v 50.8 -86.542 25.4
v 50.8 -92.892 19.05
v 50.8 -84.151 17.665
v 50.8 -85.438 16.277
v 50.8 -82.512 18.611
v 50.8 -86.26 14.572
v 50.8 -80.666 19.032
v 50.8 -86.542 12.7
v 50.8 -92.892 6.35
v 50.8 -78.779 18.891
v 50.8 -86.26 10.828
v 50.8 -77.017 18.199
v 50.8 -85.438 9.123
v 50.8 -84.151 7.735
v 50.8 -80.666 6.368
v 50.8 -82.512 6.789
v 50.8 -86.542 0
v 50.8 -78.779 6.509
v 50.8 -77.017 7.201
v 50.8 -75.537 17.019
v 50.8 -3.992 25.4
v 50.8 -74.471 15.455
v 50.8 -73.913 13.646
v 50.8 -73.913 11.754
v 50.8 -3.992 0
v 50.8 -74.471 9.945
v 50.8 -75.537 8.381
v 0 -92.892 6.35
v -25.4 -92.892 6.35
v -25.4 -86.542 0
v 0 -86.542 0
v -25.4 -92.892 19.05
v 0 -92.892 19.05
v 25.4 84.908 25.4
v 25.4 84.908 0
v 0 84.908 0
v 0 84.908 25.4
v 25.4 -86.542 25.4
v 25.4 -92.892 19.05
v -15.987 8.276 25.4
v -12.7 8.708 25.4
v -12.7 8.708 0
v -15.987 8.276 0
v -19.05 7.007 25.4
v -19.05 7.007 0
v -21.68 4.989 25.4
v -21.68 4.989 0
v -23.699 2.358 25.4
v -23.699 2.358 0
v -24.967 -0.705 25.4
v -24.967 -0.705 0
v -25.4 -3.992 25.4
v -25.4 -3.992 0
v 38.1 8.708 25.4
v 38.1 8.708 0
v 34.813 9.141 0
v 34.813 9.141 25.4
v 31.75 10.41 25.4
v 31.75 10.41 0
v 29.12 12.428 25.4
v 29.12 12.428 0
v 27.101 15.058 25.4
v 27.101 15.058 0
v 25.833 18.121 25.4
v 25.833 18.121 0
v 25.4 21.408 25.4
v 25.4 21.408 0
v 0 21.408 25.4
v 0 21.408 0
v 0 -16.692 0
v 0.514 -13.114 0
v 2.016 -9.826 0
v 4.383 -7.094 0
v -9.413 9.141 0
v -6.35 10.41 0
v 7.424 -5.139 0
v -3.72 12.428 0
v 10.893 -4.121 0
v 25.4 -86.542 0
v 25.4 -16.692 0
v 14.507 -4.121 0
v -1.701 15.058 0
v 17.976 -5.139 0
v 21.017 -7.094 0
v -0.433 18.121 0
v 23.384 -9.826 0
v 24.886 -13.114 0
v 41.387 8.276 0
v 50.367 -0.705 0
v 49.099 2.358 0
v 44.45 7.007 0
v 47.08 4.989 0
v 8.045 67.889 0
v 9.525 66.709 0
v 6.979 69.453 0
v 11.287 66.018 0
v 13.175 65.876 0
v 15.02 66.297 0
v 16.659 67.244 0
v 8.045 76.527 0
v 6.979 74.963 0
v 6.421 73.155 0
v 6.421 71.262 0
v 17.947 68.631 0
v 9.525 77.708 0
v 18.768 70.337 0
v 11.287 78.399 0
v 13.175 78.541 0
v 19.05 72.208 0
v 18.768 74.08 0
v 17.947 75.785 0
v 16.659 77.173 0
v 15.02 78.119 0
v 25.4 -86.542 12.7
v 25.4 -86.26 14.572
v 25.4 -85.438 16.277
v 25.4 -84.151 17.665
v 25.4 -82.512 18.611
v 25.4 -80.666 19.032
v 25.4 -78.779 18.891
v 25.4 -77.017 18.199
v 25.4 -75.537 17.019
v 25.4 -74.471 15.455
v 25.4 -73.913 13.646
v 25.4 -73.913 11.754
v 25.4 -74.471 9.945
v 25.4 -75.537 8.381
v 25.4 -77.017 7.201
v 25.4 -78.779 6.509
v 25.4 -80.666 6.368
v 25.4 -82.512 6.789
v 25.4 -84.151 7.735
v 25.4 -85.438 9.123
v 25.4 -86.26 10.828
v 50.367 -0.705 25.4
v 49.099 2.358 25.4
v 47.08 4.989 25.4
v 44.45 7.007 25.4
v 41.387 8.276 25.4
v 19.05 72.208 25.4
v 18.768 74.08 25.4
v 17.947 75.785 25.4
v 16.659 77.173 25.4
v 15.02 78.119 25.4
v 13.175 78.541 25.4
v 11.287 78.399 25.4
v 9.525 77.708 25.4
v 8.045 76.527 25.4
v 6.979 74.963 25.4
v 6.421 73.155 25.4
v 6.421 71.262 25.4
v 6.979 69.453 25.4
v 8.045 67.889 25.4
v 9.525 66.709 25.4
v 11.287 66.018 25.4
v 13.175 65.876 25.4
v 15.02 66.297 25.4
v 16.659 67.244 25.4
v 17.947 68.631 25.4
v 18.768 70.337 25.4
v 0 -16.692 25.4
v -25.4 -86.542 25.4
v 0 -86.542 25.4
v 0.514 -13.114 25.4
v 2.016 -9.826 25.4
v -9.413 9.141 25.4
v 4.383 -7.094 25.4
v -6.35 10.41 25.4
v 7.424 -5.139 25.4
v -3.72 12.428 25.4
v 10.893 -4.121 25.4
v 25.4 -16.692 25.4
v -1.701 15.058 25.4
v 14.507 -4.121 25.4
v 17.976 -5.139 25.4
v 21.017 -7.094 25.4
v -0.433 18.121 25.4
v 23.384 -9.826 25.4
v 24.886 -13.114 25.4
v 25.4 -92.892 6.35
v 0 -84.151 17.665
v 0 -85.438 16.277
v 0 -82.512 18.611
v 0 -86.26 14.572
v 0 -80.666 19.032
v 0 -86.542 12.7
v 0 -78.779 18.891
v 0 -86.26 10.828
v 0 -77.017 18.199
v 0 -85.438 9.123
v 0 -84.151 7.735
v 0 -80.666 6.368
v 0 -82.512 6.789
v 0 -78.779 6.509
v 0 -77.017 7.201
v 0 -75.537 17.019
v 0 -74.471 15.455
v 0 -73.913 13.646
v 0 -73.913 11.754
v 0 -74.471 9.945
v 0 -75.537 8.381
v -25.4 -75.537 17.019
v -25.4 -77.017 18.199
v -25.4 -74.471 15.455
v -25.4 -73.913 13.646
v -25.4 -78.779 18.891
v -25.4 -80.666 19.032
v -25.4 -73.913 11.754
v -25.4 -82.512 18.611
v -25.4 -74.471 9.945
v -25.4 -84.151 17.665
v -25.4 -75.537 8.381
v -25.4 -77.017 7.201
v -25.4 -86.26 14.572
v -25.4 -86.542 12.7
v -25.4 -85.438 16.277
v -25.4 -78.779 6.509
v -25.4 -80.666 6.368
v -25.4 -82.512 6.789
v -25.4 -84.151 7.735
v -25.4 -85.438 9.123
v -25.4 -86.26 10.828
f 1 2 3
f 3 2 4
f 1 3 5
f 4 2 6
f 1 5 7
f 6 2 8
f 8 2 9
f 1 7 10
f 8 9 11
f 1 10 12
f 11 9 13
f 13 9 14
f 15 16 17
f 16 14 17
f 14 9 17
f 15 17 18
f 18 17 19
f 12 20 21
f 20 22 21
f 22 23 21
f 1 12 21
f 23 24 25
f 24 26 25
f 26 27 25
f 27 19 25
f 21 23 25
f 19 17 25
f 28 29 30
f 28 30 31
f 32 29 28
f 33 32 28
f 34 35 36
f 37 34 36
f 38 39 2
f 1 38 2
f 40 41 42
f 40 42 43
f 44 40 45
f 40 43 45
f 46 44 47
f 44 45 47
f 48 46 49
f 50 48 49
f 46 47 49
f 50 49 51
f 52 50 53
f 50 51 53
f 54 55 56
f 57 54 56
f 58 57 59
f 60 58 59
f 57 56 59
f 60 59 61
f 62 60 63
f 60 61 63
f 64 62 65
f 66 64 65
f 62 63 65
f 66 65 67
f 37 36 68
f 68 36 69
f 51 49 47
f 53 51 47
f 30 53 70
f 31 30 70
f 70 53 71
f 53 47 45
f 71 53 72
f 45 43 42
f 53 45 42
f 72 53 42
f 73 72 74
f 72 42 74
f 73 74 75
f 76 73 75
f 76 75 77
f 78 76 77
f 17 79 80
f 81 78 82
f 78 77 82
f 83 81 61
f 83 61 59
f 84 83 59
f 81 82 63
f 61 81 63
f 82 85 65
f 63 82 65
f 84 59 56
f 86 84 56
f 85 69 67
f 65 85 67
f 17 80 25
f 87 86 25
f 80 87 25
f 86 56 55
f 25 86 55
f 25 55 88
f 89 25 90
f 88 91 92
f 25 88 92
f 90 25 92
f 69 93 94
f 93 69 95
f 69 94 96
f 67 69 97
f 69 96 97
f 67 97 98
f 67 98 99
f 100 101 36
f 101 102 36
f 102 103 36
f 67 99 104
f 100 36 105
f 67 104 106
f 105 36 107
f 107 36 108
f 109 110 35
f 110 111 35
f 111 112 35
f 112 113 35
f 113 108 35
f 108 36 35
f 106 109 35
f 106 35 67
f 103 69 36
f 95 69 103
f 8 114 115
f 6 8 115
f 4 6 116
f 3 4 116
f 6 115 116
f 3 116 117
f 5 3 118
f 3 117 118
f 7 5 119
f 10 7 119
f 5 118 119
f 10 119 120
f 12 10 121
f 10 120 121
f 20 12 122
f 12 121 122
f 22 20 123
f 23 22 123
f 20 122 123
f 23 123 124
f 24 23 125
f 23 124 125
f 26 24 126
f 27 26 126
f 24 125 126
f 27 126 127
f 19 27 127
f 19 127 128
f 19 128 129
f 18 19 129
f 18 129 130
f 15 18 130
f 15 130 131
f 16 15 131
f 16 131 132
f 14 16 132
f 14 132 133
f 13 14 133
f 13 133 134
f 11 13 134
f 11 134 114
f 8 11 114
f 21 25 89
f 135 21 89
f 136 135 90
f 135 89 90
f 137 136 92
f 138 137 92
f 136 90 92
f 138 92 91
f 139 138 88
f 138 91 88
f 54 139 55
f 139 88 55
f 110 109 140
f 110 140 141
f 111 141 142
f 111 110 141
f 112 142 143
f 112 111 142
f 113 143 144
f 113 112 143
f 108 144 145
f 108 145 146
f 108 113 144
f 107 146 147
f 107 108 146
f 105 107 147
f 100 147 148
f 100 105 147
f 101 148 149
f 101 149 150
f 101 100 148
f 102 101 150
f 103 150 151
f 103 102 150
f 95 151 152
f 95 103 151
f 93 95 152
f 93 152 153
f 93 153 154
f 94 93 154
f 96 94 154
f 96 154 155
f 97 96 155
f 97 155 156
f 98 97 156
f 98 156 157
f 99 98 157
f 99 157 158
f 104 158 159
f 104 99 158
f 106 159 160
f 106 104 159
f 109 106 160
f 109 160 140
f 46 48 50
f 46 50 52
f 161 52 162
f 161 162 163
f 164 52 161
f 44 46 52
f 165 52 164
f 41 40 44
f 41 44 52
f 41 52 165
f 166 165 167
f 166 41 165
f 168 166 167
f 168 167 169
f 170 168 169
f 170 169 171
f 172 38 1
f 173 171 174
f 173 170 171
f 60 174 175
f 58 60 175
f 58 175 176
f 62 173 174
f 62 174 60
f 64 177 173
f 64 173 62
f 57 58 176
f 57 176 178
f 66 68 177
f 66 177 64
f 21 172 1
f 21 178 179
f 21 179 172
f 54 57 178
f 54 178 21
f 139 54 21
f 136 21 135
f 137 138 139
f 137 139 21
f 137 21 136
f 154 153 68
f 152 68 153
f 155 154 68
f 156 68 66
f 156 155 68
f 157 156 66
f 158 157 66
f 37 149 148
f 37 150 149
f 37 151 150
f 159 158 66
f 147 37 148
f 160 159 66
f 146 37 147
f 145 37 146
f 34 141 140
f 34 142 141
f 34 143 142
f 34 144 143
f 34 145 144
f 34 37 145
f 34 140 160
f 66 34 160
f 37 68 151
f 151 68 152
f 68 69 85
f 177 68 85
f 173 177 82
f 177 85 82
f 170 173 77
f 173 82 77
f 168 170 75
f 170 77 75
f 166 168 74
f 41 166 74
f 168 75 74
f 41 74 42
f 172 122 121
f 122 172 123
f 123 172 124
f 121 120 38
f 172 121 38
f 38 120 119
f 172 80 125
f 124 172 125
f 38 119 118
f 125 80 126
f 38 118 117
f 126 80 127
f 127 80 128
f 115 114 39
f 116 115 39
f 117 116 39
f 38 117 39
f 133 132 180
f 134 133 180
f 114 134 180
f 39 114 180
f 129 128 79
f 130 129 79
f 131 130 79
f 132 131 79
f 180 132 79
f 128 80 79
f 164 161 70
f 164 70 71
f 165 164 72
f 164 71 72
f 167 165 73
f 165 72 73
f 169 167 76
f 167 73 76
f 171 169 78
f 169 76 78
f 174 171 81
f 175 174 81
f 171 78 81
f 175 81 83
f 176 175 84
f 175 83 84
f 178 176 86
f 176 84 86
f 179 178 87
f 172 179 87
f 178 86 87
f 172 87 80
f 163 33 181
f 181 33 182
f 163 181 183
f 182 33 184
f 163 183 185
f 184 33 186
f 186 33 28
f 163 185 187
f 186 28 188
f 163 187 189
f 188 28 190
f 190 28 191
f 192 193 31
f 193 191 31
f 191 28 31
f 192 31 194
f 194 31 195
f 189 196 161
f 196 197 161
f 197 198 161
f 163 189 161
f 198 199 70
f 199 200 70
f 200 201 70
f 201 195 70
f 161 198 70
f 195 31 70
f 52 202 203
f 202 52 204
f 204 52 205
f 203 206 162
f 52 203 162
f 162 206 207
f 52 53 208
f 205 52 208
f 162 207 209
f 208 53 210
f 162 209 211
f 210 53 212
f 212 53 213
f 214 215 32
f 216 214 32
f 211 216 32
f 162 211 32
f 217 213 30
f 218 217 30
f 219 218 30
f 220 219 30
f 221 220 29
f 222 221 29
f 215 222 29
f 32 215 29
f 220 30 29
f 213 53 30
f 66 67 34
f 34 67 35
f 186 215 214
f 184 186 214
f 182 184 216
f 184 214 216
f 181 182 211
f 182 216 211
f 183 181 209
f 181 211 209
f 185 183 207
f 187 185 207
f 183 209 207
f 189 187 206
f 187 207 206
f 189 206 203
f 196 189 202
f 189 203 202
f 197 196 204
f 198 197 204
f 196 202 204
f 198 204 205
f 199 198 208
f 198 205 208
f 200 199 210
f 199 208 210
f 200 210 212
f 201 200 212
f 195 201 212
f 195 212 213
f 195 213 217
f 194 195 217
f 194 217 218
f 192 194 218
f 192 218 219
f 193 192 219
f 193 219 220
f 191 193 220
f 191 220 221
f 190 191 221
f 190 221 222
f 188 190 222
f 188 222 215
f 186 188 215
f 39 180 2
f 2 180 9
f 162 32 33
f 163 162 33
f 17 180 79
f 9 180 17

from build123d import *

# Parameters (mm, degrees)
F0_R     = 6.35
F1_DEPTH = 25.4
F2_R     = 6.35
F3_DEPTH = 76.2
F4_SIZE  = 6.35


with BuildPart() as f1:
    # F0 (on Top) → F1 (new body)
    with BuildSketch(Plane.XY):
        with BuildLine():
            Line((25.4, 84.908329), (0, 84.908329))
            Line((0, 84.908329), (0, 21.408329))
            ThreePointArc((0, 21.408329), (-3.719744, 12.428073), (-12.7, 8.708329))
            ThreePointArc((-12.7, 8.708329), (-21.680256, 4.988585), (-25.4, -3.991671))
            Line((-25.4, -3.991671), (-25.4, -92.891671))
            Line((-25.4, -92.891671), (0, -92.891671))
            Line((0, -92.891671), (0, -16.691671))
            ThreePointArc((0, -16.691671), (12.7, -3.991671), (25.4, -16.691671))
            Line((25.4, -16.691671), (25.4, -92.891671))
            Line((25.4, -92.891671), (50.8, -92.891671))
            Line((50.8, -92.891671), (50.8, -3.991671))
            ThreePointArc((50.8, -3.991671), (47.080256, 4.988585), (38.1, 8.708329))
            ThreePointArc((38.1, 8.708329), (29.119744, 12.428073), (25.4, 21.408329))
            Line((25.4, 21.408329), (25.4, 84.908329))
        make_face()
        with Locations((12.7, 72.208329)):
            Circle(F0_R, mode=Mode.SUBTRACT)
    extrude(amount=F1_DEPTH)

    # F2 (on face) → F3 (cut)
    with BuildSketch(Plane(origin=(-25.4, 0, 0), x_dir=(0, -1, 0), z_dir=(-1, 0, 0))):
        with Locations((80.191671, 12.7)):
            Circle(F2_R)
    extrude(amount=-F3_DEPTH, mode=Mode.SUBTRACT)

    # F4
    f4_edges = [f1.edges().sort_by_distance(p)[0] for p in [
        (-12.7, -92.891671, 25.4),
        (-12.7, -92.891671, 0),
        (38.1, -92.891671, 25.4),
        (38.1, -92.891671, 0),
    ]]
    chamfer(f4_edges, length=F4_SIZE)


solid = f1.part
